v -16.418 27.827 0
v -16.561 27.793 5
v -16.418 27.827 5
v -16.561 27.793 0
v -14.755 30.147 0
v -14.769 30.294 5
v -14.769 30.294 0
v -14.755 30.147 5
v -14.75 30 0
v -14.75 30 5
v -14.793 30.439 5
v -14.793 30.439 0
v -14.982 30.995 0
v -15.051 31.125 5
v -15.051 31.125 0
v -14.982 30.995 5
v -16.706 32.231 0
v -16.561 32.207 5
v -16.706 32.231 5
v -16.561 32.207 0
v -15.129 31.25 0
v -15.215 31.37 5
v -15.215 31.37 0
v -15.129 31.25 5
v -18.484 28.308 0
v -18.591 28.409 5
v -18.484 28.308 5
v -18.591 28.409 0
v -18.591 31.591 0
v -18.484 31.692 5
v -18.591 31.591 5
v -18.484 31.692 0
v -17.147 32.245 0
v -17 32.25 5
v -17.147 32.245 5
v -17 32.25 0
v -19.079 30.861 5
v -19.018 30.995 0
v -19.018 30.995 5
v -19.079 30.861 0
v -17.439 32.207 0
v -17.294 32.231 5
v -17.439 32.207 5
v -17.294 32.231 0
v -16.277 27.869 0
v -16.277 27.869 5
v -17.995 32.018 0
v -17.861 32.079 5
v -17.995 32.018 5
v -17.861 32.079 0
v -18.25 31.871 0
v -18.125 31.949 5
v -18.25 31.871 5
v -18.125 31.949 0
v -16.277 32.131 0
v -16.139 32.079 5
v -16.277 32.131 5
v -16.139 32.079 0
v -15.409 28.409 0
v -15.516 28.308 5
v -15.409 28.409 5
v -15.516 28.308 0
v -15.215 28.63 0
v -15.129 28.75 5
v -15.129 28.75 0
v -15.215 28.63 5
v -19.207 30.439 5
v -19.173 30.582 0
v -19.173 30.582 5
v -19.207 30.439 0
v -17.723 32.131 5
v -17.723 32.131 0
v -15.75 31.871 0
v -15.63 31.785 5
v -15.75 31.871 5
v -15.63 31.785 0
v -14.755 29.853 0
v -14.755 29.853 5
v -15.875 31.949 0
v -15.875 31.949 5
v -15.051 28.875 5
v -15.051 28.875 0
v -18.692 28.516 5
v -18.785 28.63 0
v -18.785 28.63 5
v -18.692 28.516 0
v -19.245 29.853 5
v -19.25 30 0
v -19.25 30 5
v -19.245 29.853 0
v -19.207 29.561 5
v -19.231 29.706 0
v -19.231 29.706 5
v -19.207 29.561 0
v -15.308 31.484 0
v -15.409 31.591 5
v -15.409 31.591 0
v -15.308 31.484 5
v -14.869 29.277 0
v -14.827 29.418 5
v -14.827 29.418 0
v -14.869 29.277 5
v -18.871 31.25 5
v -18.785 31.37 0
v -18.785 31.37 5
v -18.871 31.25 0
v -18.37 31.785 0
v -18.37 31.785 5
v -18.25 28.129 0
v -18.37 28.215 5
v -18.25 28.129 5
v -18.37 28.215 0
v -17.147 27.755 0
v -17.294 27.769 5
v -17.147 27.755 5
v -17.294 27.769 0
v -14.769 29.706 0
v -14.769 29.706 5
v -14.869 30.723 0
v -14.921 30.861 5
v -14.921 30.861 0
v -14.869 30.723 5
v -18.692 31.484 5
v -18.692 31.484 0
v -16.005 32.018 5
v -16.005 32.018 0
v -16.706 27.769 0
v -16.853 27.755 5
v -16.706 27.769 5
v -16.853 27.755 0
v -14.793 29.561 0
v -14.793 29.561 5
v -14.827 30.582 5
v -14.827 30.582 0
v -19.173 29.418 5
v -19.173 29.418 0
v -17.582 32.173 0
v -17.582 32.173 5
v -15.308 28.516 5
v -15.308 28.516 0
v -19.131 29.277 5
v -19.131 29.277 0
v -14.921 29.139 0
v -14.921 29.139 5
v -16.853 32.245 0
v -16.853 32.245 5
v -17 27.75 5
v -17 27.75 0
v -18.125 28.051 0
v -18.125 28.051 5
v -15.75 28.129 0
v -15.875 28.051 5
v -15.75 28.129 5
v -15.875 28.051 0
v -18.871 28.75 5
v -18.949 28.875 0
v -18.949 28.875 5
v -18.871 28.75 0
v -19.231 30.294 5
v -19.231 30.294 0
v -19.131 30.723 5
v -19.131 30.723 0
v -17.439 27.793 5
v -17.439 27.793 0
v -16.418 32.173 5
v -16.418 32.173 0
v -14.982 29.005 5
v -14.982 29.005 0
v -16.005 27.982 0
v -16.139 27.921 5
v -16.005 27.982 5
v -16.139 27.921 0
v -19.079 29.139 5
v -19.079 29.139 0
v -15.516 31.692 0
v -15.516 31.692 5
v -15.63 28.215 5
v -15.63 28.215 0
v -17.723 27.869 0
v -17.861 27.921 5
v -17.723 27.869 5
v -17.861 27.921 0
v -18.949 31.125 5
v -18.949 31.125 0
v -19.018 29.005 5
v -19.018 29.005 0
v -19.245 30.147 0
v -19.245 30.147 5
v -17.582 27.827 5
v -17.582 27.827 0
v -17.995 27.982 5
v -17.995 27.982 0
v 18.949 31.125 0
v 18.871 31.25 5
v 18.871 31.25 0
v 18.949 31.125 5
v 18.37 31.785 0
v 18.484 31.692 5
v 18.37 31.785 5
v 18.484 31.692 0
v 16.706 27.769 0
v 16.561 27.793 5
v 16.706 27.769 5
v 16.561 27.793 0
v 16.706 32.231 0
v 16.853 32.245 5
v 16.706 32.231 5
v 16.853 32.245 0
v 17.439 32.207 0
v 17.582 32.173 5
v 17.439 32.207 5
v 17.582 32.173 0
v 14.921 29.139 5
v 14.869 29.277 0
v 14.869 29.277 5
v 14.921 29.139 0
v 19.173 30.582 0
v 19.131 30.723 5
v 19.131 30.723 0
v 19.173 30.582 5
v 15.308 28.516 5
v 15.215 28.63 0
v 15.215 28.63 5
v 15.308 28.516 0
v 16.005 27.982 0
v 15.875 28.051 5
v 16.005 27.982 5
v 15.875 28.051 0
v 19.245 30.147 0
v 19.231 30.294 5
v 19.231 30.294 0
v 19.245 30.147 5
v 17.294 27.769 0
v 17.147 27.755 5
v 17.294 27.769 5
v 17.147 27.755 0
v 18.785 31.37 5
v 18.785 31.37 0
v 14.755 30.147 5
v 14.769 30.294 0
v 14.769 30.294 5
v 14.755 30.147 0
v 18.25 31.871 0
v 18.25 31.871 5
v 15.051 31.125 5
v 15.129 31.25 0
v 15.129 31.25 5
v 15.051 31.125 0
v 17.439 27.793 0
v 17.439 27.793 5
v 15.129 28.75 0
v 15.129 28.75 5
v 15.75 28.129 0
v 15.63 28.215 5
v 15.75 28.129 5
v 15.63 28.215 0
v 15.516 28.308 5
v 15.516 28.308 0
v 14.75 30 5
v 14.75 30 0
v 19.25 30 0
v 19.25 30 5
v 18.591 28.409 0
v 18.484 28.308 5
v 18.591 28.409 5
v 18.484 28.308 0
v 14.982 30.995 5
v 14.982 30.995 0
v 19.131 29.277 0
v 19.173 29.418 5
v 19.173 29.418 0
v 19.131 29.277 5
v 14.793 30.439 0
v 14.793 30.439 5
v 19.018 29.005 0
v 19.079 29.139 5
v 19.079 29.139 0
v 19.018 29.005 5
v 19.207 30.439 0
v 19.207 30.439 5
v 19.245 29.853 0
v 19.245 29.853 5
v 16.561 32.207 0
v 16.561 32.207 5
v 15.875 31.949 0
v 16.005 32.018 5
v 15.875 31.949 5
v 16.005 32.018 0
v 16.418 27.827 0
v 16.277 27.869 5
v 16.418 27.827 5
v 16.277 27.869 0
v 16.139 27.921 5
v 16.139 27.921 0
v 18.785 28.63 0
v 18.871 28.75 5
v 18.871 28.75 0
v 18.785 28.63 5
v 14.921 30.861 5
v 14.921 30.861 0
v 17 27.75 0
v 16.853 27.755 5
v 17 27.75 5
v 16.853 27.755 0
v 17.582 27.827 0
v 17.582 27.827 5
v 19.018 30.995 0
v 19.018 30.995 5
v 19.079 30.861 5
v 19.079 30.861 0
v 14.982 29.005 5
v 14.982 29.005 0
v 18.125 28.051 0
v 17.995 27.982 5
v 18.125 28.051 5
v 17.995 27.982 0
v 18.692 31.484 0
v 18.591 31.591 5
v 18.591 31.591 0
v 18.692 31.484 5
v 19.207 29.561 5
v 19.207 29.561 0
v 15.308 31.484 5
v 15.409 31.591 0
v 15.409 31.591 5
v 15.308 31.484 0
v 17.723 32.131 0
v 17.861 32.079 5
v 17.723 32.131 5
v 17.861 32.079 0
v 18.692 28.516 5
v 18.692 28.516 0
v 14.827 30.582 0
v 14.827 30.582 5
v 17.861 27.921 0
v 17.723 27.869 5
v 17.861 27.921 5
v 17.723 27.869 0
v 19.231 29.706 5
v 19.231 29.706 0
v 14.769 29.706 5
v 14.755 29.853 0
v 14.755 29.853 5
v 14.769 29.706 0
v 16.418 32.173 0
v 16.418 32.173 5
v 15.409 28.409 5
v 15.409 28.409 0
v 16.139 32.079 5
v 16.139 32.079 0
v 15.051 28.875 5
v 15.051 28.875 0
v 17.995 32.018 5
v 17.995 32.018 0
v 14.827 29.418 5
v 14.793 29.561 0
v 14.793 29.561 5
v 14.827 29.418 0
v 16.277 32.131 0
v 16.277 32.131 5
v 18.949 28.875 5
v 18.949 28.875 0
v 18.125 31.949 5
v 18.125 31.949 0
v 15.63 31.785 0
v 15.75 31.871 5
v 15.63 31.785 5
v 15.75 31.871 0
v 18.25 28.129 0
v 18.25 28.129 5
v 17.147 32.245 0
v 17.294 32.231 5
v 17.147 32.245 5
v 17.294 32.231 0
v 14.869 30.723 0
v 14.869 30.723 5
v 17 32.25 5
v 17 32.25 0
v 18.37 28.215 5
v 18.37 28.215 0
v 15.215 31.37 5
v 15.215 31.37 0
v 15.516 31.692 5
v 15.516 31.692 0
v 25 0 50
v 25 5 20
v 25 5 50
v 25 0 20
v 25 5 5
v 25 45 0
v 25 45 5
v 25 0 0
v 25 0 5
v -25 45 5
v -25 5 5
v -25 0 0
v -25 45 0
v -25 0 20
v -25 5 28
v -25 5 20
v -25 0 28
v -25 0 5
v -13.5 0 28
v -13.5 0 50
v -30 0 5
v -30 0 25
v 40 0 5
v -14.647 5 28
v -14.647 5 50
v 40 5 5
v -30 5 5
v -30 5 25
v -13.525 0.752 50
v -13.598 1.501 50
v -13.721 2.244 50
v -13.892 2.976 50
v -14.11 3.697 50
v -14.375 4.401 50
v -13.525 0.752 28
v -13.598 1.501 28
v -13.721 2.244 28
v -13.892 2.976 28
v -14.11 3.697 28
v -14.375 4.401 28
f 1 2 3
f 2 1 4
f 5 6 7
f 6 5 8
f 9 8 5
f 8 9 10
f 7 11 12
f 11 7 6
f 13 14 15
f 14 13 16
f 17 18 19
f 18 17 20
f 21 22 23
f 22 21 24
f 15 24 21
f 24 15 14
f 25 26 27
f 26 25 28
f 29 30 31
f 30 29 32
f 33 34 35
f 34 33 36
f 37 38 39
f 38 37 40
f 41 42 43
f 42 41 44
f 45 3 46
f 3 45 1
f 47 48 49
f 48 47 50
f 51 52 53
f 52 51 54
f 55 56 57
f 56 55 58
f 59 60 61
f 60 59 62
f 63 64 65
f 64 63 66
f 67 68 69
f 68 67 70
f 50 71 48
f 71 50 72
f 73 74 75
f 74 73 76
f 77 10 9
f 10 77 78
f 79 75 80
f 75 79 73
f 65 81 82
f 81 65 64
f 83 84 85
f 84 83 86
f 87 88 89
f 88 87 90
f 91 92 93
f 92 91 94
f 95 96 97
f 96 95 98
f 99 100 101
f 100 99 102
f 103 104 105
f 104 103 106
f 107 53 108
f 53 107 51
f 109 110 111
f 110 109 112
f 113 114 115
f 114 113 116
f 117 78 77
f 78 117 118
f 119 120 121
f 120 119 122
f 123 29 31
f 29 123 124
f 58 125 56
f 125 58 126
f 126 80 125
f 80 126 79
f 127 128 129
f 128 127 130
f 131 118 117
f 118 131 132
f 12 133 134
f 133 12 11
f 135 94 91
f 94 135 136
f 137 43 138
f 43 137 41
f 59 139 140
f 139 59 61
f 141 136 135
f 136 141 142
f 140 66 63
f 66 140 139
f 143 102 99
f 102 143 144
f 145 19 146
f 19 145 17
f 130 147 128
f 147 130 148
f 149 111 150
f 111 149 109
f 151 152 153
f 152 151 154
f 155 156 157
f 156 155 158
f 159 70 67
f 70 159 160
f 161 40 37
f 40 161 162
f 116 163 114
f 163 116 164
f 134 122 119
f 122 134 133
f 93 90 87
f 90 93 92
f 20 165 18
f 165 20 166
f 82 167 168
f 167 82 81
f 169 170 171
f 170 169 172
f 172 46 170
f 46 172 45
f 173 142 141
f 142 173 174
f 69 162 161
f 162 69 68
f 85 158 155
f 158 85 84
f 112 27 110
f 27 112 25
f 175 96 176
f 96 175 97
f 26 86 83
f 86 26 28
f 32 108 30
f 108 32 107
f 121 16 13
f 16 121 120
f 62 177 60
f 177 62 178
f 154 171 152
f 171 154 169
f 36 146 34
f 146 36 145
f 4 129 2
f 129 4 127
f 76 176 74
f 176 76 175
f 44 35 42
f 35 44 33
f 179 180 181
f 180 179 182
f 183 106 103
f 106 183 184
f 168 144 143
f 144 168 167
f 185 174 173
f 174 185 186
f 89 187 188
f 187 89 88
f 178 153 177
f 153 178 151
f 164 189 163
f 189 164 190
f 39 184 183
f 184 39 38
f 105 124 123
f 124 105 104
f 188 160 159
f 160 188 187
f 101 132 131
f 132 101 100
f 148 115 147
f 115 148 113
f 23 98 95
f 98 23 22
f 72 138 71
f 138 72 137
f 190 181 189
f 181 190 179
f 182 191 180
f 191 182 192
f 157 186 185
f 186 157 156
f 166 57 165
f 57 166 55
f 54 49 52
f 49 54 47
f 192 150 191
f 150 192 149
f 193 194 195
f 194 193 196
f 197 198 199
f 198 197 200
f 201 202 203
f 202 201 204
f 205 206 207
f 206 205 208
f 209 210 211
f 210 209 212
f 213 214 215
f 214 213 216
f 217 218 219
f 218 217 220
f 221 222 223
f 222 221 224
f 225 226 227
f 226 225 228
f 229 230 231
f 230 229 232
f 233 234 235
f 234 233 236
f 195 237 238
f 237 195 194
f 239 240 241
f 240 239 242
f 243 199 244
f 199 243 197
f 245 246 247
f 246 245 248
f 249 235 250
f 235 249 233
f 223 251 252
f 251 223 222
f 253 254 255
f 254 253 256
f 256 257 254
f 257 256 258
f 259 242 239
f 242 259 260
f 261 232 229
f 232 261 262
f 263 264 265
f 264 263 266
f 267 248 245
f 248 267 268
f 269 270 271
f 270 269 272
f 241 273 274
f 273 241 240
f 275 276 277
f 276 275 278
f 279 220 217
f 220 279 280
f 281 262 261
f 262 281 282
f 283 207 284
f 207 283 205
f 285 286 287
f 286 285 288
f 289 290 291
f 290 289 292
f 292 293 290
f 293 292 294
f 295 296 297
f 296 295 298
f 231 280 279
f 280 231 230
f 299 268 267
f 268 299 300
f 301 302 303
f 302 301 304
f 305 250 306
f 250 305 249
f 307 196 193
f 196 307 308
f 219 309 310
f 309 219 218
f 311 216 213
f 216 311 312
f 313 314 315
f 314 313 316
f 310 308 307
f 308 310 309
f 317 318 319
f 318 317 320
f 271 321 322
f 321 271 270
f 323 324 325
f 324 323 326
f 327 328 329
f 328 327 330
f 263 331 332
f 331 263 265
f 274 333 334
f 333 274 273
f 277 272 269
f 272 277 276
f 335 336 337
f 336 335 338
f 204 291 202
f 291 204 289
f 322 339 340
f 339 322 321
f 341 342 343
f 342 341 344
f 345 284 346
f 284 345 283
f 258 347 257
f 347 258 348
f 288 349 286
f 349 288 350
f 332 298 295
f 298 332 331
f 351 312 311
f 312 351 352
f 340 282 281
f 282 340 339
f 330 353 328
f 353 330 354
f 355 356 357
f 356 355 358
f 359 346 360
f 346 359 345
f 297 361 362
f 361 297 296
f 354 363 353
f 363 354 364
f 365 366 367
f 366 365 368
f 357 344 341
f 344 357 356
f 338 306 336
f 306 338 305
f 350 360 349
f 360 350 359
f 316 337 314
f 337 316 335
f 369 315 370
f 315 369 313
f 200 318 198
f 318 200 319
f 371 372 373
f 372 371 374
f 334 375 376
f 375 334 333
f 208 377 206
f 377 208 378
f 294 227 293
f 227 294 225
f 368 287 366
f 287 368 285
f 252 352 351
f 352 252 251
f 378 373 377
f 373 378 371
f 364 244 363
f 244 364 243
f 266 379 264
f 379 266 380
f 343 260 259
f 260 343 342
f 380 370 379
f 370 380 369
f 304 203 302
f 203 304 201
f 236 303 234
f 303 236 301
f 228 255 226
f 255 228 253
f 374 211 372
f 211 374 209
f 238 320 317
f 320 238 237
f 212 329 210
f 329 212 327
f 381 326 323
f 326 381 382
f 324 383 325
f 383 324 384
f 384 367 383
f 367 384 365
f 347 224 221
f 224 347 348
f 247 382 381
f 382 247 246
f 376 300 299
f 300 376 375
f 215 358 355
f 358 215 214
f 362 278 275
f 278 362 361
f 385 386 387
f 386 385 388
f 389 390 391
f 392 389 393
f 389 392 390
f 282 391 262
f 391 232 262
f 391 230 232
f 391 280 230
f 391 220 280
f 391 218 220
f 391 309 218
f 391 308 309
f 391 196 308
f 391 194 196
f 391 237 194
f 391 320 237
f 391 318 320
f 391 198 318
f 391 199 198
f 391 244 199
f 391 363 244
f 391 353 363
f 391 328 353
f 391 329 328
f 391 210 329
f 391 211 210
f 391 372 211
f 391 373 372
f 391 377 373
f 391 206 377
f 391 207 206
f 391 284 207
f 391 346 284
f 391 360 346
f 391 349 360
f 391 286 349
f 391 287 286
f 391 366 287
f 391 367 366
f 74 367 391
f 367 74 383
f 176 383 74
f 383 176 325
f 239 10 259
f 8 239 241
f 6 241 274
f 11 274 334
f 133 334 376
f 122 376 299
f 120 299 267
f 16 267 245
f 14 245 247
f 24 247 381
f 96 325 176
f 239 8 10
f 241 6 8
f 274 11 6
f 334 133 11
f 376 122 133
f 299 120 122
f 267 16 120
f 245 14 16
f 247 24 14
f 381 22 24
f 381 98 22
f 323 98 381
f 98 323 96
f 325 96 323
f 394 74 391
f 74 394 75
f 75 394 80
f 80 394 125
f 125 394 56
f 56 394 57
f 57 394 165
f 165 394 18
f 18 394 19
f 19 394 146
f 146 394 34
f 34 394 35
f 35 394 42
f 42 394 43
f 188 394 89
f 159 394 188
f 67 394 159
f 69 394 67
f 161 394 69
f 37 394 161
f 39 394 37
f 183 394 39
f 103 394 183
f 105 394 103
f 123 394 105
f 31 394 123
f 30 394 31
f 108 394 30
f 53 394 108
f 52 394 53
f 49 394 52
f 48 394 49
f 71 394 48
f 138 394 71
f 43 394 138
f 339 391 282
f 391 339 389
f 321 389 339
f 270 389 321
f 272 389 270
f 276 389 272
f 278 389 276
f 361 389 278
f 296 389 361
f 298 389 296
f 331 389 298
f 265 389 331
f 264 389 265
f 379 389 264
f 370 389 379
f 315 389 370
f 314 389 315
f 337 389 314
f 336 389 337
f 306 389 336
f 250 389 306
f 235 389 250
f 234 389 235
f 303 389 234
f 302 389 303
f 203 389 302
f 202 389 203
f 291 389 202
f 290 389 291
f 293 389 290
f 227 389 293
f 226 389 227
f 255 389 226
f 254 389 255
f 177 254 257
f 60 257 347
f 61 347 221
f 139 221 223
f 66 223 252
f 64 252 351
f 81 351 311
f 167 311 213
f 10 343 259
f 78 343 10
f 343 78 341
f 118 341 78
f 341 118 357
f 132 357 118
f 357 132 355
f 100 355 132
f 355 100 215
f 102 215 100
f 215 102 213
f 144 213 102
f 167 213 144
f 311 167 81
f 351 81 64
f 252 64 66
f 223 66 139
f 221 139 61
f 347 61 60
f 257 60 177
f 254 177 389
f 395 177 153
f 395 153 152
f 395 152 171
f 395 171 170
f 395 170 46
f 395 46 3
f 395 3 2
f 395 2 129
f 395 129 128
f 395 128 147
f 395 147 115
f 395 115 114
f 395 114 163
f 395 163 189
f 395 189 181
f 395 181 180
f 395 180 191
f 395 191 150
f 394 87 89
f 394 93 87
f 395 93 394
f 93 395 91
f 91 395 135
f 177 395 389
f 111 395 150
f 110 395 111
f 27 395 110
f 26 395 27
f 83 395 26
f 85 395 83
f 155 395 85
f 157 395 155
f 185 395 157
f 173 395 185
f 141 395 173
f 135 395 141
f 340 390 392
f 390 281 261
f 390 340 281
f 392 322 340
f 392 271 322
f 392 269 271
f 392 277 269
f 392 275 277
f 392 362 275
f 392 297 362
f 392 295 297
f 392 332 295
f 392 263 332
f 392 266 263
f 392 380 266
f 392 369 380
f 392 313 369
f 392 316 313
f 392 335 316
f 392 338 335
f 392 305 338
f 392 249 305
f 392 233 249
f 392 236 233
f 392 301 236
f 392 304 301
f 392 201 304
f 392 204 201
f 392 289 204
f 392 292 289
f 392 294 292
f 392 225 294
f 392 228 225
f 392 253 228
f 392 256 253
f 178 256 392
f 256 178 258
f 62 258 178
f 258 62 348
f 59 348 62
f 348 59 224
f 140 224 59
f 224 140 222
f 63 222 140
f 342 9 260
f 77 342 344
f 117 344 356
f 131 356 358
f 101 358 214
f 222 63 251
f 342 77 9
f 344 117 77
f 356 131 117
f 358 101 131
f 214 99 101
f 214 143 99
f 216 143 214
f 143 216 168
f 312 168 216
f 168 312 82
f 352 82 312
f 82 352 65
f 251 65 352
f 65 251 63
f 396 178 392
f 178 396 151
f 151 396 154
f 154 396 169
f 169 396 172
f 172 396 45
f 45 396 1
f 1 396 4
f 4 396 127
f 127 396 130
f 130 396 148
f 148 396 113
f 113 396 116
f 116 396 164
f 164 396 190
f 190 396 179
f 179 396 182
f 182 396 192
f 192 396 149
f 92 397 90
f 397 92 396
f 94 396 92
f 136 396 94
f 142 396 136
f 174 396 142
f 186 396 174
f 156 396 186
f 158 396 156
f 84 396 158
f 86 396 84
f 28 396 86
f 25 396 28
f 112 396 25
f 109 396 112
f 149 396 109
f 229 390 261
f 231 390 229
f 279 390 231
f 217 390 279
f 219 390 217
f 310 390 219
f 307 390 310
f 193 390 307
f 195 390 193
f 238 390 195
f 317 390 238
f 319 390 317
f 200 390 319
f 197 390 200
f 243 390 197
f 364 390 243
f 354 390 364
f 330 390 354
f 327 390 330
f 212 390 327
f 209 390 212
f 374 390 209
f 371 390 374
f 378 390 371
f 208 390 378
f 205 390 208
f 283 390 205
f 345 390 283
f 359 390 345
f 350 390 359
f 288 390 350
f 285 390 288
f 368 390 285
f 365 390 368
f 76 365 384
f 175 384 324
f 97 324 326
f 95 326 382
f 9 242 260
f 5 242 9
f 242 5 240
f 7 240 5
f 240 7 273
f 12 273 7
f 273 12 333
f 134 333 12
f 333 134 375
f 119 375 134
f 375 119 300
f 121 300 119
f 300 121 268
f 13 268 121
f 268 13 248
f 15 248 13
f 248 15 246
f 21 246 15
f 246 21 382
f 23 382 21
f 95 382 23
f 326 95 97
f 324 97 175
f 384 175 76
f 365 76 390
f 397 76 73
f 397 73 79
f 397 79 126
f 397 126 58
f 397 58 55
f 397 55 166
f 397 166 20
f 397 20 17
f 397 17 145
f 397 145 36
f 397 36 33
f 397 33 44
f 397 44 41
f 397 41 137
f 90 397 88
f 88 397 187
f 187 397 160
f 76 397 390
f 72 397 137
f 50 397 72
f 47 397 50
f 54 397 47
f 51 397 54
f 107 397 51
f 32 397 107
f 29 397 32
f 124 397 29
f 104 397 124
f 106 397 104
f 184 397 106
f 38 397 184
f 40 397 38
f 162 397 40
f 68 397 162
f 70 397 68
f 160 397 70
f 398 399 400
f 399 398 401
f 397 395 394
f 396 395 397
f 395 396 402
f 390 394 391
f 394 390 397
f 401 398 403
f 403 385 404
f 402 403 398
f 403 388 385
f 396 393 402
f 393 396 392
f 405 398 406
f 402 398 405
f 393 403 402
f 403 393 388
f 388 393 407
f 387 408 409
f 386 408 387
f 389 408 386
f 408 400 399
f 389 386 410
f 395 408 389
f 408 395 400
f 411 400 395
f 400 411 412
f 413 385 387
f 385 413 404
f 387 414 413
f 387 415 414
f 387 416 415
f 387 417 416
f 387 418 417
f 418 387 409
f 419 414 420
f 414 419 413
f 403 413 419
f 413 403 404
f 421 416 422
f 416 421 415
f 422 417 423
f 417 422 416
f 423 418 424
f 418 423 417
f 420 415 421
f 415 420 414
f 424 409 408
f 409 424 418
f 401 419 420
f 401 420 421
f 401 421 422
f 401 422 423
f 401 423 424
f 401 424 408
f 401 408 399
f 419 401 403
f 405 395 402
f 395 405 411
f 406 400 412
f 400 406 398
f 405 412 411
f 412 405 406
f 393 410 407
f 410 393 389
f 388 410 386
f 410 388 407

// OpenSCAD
// L-shaped mounting bracket for NEMA 17 stepper motor
// Print orientation: base plate on bed, motor plate builds upward (+Z)

// ---------------- Parameters ----------------
plate_x       = 50;    // base plate length (x: -25 to 25)
plate_y       = 45;    // base plate width (y: 0 to 45)
plate_t       = 5;     // base plate thickness (z: 0 to 5)

motor_h       = 50;    // motor plate height (z: 0 to 50)
motor_d       = 23;    // motor boss hole diameter
motor_z       = 28;    // motor boss hole centre height
motor_x       = 0;     // motor boss hole centre x

screw_d       = 3.4;   // M3 screw hole diameter
screw_nx      = 31;    // screw pattern side length (square)
screw_count   = 4;     // number of screw holes

gusset_t      = 5;     // gusset thickness (x)
gusset_leg    = 20;    // gusset leg length along +Y and +Z
gusset_x      = [-25, 25]; // gusset outer x edges (extends into plates)

eps           = 0.5;   // cutter overshoot past faces

$fn = 96;

// ---------------- Model ----------------
union() {
    // Base plate with M4 through-holes
    difference() {
        translate([-plate_x/2, 0, 0])
            cube([plate_x, plate_y, plate_t]);
        for (sx = [-17, 17])
            translate([sx, 30, -eps])
                cylinder(d = 4.5, h = plate_t + 2*eps);
    }

    // Vertical motor plate with boss hole and M3 screw holes
    translate([-plate_x/2, 0, 0])
        difference() {
            cube([plate_x, 5, motor_h]);
            translate([motor_x, 0, motor_z])
                cylinder(d = motor_d, h = plate_y + 2*eps);
            for (i = [0 : screw_count - 1]) {
                a = i < 2 ? 0 : 90;
                rotate([0, 0, a])
                    translate([-screw_nx/2, 0, -eps])
                        cube([screw_nx, 5, screw_d + 2*eps]);
            }
        }

    // Triangular gussets, flush with plate edges
    for (gx = gusset_x)
        translate([gx - gusset_t, 5, 5])
            rotate([90, 0, 0])
                linear_extrude(height = gusset_t)
                    polygon([
                        [0, 0],
                        [gusset_leg, 0],
                        [0, gusset_leg]
                    ]);
}
